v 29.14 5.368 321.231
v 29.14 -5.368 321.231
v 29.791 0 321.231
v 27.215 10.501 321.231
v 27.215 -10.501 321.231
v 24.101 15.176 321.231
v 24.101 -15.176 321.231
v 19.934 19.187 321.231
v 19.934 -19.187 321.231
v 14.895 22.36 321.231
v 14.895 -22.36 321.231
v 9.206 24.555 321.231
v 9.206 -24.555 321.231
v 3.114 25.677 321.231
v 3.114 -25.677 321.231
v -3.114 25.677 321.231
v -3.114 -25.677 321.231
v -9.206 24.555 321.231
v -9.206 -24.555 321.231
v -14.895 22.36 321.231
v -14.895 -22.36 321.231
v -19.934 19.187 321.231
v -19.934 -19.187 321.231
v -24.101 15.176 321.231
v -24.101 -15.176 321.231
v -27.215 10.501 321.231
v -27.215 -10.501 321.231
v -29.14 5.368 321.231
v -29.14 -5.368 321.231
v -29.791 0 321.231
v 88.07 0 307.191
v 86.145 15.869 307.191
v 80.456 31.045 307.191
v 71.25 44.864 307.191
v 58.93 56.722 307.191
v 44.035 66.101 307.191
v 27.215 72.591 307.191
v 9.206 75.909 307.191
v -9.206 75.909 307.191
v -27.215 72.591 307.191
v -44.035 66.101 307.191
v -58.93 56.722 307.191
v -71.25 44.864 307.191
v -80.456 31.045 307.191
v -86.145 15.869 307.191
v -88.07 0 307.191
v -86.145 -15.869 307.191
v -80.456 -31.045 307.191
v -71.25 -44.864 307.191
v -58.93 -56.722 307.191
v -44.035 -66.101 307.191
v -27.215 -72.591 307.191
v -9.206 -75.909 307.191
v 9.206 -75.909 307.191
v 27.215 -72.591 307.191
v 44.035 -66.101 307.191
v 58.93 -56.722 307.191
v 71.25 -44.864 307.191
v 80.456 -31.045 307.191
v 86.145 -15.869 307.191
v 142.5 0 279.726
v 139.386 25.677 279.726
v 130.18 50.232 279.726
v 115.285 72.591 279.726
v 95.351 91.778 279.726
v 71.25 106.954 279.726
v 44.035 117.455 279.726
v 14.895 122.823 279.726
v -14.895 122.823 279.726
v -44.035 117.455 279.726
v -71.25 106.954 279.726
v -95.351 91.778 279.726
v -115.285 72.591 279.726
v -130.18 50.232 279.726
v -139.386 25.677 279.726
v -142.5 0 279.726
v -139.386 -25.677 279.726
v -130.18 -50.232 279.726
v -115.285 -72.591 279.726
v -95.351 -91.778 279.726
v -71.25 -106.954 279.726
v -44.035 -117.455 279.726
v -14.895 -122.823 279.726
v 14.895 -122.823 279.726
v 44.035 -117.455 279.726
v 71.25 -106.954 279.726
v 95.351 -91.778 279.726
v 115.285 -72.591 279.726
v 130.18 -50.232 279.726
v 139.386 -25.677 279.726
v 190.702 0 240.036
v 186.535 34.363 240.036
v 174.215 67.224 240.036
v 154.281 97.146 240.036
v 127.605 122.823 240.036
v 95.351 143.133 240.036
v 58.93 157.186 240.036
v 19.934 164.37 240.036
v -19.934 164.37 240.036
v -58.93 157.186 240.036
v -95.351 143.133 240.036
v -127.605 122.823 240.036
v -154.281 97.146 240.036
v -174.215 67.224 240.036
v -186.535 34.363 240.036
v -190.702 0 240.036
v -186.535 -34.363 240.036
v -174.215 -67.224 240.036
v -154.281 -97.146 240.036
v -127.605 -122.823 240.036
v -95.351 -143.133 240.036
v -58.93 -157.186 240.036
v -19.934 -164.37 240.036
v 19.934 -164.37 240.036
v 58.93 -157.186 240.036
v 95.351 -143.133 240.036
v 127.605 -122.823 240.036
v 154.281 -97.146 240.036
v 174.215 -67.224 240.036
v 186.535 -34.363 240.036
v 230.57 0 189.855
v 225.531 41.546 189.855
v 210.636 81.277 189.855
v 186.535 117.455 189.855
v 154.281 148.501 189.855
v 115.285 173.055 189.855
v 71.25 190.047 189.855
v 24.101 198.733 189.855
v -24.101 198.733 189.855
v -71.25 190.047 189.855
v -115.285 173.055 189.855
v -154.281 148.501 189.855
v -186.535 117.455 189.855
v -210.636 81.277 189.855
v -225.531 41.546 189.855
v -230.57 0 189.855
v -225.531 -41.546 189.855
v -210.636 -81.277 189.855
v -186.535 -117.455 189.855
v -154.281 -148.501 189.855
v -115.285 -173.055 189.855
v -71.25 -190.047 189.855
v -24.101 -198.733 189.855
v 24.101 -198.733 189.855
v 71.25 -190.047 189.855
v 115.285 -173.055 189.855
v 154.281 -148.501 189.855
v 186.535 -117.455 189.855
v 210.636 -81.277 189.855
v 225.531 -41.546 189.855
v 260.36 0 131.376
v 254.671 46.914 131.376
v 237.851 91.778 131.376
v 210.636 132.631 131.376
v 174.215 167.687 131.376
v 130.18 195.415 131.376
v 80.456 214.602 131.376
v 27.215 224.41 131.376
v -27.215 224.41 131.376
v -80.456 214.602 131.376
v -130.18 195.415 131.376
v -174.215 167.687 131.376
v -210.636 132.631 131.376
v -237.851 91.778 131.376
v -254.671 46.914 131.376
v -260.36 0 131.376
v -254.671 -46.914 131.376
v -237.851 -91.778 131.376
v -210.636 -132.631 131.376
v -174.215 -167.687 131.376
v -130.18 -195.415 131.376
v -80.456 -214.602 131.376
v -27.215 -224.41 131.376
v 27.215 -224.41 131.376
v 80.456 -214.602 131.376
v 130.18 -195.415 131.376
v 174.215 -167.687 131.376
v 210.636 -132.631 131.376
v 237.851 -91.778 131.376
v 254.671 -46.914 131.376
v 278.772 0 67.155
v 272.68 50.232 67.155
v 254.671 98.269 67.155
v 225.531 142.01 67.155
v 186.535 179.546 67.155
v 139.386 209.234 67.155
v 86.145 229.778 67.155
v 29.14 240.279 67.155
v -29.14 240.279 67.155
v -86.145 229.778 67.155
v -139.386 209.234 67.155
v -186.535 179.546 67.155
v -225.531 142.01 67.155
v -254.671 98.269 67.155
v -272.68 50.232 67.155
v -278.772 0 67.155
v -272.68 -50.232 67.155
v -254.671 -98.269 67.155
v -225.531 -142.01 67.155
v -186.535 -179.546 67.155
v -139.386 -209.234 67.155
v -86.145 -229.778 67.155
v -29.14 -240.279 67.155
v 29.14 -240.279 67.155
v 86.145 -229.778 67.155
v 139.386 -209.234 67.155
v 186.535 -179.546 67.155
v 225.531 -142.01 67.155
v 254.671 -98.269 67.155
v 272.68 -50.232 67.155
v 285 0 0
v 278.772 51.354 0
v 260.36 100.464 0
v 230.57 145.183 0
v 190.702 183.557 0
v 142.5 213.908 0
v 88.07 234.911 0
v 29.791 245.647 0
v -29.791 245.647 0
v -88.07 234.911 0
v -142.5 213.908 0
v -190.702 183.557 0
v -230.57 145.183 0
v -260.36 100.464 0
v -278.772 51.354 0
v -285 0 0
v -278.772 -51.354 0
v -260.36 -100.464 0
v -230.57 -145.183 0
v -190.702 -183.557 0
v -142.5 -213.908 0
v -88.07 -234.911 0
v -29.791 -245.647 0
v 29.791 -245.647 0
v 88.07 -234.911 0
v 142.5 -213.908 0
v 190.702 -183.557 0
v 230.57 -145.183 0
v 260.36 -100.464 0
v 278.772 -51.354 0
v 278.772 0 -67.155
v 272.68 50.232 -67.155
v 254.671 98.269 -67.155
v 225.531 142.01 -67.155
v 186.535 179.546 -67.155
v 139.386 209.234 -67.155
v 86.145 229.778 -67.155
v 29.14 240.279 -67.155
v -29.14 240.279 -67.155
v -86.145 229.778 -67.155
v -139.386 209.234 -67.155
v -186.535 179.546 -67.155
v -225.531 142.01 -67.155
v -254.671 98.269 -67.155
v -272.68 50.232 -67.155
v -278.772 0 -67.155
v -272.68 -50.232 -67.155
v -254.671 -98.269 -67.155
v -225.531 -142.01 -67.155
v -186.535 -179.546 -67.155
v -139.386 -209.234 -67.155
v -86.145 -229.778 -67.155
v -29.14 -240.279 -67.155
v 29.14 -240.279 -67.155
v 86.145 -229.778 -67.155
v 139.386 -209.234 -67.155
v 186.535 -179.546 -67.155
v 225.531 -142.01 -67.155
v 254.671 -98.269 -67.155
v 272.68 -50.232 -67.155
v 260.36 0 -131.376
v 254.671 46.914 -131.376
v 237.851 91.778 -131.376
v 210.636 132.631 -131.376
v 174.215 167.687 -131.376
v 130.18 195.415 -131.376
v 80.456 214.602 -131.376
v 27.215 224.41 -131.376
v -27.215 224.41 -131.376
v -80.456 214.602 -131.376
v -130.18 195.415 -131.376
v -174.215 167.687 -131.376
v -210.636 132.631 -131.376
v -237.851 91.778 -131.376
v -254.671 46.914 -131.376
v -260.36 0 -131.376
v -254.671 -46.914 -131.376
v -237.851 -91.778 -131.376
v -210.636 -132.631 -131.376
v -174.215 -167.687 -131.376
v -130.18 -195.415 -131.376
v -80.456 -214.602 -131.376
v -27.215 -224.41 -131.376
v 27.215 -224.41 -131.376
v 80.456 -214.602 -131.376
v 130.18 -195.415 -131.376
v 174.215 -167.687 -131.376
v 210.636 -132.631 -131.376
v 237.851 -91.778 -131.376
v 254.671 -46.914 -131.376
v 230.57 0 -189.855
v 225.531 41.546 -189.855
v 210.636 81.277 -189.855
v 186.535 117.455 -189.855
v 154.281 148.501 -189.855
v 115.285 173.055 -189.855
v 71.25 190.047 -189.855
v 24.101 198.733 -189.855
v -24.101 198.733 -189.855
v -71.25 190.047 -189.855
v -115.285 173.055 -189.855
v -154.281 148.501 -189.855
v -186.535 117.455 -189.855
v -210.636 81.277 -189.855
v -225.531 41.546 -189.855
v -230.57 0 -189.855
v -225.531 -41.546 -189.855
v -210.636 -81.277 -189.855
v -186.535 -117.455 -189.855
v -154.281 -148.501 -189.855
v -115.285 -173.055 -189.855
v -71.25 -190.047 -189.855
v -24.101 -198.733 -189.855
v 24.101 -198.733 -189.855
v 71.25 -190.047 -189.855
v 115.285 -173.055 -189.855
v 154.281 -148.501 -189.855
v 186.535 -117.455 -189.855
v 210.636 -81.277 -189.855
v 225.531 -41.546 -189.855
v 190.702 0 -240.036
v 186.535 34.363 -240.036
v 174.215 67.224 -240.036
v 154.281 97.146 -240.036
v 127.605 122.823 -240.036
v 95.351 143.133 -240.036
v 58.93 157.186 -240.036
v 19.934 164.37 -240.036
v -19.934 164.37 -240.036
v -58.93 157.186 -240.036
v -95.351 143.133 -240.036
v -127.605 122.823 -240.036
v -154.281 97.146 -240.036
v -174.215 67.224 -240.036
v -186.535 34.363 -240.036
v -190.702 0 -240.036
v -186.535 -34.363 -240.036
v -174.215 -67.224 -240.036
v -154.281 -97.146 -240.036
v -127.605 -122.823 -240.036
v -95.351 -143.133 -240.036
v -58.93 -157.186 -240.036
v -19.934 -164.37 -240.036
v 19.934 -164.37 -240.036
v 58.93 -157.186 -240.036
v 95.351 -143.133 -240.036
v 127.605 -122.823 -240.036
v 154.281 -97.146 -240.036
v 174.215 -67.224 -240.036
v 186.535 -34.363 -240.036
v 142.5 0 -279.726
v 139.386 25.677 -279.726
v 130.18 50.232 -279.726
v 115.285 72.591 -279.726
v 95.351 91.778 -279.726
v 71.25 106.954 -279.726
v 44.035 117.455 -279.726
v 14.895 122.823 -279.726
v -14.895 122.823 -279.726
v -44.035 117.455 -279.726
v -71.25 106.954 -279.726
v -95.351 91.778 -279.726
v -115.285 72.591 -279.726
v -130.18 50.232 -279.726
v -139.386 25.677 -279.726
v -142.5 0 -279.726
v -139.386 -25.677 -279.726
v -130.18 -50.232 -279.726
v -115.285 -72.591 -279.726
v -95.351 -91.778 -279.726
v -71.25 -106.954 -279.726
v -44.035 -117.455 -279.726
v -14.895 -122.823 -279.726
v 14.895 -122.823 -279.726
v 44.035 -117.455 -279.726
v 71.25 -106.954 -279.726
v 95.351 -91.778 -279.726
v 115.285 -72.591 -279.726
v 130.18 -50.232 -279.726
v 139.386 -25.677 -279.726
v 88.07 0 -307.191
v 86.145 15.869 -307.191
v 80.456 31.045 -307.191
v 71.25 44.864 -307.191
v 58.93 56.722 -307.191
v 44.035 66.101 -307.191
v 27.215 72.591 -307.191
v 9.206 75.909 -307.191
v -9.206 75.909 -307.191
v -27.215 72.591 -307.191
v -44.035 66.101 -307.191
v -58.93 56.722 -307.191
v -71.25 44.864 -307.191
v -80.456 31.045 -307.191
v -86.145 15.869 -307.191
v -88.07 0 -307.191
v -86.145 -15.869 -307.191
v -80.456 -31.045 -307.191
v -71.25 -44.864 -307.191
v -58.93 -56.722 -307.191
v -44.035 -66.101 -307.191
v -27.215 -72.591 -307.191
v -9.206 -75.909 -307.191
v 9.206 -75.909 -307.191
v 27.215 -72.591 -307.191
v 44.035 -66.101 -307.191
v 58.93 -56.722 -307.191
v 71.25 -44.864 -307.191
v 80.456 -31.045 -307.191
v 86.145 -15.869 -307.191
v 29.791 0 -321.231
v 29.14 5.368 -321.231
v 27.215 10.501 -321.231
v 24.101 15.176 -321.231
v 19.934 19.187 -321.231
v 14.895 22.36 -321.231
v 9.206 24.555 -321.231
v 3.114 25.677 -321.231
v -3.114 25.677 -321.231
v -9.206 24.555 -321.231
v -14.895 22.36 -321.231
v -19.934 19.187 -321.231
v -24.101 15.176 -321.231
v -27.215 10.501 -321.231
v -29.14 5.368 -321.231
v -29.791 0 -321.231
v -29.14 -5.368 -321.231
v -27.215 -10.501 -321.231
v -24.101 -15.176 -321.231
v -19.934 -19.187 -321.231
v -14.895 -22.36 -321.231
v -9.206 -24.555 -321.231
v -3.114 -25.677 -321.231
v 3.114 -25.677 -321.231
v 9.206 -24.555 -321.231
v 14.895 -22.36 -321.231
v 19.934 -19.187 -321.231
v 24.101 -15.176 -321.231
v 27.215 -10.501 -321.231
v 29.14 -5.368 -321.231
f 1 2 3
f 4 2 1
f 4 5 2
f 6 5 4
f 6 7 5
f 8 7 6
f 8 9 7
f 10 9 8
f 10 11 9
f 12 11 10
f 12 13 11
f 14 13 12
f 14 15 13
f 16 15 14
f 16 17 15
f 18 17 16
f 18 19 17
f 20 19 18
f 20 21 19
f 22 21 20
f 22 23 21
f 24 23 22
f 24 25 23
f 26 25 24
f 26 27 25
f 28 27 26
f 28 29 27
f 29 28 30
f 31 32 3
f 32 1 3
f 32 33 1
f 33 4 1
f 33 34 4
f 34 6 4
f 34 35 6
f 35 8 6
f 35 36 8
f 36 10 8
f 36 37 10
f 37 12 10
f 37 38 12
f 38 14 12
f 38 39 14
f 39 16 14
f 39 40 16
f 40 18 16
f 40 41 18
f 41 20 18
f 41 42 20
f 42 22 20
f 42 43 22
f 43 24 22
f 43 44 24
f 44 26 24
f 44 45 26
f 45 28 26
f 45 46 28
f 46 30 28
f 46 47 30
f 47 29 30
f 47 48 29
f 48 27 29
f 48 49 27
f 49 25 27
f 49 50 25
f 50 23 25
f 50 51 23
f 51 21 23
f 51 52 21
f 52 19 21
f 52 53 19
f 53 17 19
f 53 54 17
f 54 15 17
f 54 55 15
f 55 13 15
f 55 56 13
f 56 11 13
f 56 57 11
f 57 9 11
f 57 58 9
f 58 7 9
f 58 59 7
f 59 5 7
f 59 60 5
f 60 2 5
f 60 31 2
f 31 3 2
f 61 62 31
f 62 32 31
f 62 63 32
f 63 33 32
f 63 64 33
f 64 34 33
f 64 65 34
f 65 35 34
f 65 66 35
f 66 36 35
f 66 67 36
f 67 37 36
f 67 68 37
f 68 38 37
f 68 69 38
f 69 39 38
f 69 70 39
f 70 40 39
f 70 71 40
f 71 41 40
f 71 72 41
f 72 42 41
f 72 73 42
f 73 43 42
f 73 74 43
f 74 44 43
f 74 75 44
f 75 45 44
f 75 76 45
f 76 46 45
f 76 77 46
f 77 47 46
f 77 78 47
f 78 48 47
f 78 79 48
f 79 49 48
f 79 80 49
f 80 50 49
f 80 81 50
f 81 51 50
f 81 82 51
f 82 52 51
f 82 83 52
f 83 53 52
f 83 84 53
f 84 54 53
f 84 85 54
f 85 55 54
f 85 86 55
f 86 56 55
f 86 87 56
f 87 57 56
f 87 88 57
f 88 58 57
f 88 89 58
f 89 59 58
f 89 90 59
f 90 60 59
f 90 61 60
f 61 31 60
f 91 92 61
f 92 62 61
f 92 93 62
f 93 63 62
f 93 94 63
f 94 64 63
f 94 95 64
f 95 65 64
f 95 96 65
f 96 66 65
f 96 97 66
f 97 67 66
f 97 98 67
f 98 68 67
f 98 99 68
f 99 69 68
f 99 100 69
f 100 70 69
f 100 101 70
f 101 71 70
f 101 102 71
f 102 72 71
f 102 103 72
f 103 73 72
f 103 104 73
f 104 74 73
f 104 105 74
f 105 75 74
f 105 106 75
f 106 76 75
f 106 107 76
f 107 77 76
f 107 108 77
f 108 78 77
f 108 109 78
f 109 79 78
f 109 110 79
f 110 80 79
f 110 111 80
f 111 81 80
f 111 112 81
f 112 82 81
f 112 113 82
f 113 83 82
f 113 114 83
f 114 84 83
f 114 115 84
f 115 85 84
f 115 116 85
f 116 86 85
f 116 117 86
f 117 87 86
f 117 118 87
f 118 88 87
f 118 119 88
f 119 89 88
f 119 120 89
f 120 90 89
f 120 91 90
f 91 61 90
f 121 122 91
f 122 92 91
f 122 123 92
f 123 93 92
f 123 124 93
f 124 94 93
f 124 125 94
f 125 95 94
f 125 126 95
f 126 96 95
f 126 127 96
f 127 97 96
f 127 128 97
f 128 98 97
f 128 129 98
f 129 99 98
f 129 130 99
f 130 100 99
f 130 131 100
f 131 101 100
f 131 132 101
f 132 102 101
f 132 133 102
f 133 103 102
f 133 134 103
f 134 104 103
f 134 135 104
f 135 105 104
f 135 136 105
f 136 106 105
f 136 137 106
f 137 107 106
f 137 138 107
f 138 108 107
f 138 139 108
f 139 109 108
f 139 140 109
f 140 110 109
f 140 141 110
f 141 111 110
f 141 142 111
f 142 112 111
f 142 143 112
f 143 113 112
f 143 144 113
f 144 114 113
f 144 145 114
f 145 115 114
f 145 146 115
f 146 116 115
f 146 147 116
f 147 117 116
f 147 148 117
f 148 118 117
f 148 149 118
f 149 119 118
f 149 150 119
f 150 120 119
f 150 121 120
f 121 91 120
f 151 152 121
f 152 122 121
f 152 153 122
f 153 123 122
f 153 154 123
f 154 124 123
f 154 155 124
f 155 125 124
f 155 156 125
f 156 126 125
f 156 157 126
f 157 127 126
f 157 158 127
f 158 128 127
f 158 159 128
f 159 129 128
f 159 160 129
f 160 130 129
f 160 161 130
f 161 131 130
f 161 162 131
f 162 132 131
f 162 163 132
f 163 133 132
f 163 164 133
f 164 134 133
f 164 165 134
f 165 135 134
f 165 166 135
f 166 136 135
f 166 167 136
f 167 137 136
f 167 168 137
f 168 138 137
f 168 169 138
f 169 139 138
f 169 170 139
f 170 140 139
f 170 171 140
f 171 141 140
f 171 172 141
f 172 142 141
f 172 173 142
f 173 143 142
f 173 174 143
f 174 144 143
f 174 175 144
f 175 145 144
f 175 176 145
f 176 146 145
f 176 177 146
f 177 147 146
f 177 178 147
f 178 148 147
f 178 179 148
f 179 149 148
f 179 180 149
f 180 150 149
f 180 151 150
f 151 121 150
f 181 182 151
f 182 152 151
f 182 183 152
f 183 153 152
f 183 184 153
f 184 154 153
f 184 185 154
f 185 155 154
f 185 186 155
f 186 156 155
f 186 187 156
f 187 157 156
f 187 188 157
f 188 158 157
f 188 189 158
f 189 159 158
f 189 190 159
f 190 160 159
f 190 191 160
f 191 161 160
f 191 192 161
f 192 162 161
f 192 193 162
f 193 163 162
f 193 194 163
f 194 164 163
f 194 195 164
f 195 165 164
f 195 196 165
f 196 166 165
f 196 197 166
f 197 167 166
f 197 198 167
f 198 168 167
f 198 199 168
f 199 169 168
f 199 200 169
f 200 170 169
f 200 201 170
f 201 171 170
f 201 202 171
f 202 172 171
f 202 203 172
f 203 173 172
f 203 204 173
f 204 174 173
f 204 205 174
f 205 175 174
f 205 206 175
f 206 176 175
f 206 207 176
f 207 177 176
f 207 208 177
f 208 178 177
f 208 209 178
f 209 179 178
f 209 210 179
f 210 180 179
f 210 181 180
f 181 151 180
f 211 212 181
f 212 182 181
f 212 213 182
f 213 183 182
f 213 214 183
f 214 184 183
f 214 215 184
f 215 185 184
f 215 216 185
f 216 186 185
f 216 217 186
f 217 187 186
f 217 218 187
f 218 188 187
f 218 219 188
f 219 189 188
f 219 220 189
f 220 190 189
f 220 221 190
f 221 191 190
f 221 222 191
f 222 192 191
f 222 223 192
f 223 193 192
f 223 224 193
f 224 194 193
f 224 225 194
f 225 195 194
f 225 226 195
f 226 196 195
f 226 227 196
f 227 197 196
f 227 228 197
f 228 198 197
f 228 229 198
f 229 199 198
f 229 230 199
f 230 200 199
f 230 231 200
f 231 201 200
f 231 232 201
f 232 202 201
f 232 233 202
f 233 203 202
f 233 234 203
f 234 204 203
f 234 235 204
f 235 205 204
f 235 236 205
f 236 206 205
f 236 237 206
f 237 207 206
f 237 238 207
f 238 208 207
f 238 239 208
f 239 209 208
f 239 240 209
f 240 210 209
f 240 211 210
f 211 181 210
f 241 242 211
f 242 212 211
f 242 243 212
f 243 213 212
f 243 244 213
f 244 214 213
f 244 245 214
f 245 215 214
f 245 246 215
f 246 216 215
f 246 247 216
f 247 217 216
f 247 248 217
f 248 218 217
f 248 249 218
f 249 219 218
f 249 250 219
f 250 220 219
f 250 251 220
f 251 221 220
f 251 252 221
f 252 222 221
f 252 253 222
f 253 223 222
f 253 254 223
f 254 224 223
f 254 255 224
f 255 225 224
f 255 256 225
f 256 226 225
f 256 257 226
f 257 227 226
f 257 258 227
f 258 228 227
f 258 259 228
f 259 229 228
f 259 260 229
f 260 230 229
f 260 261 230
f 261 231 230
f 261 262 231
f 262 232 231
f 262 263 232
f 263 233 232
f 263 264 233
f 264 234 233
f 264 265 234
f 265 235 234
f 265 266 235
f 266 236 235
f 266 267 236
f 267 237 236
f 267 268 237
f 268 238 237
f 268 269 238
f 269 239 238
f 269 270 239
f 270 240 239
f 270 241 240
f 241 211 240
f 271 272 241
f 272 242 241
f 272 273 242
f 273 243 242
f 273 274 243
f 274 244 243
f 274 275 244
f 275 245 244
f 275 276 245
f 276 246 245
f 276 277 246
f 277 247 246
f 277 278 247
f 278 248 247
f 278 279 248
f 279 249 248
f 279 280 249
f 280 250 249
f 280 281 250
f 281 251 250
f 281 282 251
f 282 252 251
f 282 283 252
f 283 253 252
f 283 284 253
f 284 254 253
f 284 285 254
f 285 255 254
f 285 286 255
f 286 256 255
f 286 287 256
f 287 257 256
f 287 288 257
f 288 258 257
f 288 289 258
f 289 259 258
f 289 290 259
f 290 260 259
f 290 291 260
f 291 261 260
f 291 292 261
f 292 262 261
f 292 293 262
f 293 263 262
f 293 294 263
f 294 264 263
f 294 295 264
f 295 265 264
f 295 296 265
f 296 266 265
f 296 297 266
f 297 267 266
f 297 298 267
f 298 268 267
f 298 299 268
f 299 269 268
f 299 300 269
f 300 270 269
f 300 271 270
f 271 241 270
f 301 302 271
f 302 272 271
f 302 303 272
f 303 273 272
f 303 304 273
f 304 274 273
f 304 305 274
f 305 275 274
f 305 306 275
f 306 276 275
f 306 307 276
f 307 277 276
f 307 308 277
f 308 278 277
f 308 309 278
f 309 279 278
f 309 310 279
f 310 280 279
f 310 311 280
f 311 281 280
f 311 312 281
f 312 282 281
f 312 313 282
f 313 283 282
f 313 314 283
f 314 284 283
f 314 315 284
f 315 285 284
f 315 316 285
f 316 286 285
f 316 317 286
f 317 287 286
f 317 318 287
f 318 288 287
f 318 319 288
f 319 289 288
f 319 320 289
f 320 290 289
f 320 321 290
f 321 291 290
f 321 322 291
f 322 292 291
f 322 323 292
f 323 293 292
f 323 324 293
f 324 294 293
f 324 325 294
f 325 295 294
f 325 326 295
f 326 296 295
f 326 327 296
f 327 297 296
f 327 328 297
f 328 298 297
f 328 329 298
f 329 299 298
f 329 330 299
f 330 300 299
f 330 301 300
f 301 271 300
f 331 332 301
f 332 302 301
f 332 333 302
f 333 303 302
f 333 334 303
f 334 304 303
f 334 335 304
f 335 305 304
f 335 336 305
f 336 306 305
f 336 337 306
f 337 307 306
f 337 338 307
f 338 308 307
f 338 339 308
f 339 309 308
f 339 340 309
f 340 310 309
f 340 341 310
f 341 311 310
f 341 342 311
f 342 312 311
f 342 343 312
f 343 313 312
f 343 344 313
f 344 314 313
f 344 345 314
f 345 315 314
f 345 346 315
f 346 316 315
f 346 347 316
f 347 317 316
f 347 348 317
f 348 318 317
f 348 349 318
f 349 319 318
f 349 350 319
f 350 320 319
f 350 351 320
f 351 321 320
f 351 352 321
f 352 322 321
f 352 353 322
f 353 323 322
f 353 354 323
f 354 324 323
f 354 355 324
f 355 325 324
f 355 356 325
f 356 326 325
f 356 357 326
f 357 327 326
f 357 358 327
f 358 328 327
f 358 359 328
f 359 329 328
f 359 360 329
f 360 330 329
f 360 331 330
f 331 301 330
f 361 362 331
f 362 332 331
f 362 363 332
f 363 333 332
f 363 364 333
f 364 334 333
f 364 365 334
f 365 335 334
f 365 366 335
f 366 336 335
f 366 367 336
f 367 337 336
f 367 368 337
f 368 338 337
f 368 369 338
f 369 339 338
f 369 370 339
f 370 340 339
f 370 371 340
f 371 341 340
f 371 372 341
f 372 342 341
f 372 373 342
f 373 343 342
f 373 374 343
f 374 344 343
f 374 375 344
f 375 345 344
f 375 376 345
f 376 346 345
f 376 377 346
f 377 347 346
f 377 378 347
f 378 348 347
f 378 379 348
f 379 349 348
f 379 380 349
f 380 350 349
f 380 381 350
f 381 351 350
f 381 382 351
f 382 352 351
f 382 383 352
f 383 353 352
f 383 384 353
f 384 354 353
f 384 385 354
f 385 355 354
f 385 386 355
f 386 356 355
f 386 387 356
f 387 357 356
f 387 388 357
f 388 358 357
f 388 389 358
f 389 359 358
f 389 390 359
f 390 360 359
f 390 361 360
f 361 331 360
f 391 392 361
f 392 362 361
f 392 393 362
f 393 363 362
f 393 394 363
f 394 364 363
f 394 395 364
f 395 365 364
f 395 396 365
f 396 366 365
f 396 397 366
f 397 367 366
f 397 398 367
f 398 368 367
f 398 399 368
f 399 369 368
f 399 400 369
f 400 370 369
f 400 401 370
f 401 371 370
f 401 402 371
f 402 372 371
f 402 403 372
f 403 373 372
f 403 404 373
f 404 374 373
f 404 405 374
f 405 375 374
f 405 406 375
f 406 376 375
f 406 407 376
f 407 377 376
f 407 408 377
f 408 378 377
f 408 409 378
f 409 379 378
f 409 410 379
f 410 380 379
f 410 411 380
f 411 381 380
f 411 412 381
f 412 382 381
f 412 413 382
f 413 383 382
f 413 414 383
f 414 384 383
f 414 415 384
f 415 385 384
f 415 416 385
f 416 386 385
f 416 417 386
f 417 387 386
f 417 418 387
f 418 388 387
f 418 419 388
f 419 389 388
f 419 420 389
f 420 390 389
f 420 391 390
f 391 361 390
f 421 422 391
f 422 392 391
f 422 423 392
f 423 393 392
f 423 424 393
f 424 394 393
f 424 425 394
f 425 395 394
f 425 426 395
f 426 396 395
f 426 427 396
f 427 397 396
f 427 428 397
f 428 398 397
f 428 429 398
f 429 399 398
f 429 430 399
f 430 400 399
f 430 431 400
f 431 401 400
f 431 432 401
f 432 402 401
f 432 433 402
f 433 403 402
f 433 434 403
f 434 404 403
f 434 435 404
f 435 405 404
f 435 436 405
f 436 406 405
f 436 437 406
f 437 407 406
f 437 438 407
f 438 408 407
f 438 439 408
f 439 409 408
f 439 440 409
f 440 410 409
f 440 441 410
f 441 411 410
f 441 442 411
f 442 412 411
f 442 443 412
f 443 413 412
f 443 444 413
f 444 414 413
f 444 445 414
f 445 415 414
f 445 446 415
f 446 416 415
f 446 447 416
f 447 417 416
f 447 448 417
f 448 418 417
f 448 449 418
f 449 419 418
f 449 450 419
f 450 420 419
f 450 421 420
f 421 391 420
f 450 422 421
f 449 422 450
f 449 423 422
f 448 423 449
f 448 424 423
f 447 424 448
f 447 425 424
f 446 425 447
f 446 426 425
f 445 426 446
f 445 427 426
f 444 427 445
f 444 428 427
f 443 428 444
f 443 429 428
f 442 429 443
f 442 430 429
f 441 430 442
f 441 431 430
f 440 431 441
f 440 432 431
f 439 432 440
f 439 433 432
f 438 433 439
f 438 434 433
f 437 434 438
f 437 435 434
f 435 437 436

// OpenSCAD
// Generated by SolidPython 1.0.1 on 2020-07-29 00:46:52


scale(v = [15, 13, 17]) {
	sphere(r = 19);
}
/***********************************************
*********      SolidPython code:      **********
************************************************
 
# import packages: SolidPython
from solid import *
from solid.utils import *
from itertools import chain, combinations, permutations


class Resize:

    def __init__(self, scad_file):
        self.scad_file = scad_file
        #self.scad_file = import_scad(scad_file)
        # cone/cylinder param:
        self.r1 = 0
        self.r2 = 0
        self.h = 0
        # rectangular prism param:
        self.w = 0
        self.l = 0
        # ellipse param:
        self.r = 0

    # import OpenScad code (file name corresponds to shape)


    # classify shape + parameters
    def assign(self, param1, param2, param3):
        if self.scad_file == 'cone.scad':
            self.r1 = param1
            self.r2 = param2
            self.h = param3
        elif self.scad_file == 'cylinder.scad':
            self.r1 = param1
            self.r2 = param2
            self.h = param3
        elif self.scad_file == 'rectangularPrism.scad':
            self.h = param1
            self.l = param2
            self.w = param3
        else:
            self.r = param1
            self.h = param2

    # resize parameters
    def iterate(self):
        x = range(3, 20, 2)
        i = 1
        if self.scad_file == 'cone.scad':
            tempList = list(permutations(x, 2))
            for temp in tempList:
                param1 = temp[0]
                param2 = temp[1]
                filepath = 'produced_scad_files/' + 'cone' + str(param1) + '_' + str(param2) + '_' + '.scad'
                scad_render_to_file(cylinder(h=param1, r1=param2, r2=0), filepath)

        elif self.scad_file == 'cylinder.scad':
            tempList = list(permutations(x, 3))
            for temp in tempList:
                param1 = temp[0]
                param2 = temp[1]
                filepath = 'produced_scad_files/' + 'cylinder' + str(param1) + '_' + str(param2) + '_' + '.scad'
                scad_render_to_file(cylinder(h=param1, r1=param2, r2=param2), filepath)

        elif self.scad_file == 'rectangularPrism.scad':
            tempList = list(permutations(x, 3))
            for temp in tempList:
                param1 = temp[0]
                param2 = temp[1]
                param3 = temp[2]
                filepath = 'produced_scad_files/' + 'rectangularPrism' + str(param1) + '_' + str(param2) + '_' + str(
                    param3) + '.scad'
                scad_render_to_file(cube(size=(param1, param2, param3)), filepath)

        elif self.scad_file == 'ellipse.scad':
            tempList = list(permutations(x, 4))
            for temp in tempList:
                param1 = temp[0]
                param2 = temp[1]
                param3 = temp[2]
                param4 = temp[3]
                filepath = 'produced_scad_files/' + 'ellipse' + str(param1) + '_' + str(param2) + '_' + str(param3) + '_' + str(param4) + '.scad'
                scad_render_to_file(scale([param1, param2, param3])(sphere(r=param4)), filepath)

    def render_to_scadfile(self):
        scad_render_to_file(scad, 'example.scad') 
 
************************************************/
